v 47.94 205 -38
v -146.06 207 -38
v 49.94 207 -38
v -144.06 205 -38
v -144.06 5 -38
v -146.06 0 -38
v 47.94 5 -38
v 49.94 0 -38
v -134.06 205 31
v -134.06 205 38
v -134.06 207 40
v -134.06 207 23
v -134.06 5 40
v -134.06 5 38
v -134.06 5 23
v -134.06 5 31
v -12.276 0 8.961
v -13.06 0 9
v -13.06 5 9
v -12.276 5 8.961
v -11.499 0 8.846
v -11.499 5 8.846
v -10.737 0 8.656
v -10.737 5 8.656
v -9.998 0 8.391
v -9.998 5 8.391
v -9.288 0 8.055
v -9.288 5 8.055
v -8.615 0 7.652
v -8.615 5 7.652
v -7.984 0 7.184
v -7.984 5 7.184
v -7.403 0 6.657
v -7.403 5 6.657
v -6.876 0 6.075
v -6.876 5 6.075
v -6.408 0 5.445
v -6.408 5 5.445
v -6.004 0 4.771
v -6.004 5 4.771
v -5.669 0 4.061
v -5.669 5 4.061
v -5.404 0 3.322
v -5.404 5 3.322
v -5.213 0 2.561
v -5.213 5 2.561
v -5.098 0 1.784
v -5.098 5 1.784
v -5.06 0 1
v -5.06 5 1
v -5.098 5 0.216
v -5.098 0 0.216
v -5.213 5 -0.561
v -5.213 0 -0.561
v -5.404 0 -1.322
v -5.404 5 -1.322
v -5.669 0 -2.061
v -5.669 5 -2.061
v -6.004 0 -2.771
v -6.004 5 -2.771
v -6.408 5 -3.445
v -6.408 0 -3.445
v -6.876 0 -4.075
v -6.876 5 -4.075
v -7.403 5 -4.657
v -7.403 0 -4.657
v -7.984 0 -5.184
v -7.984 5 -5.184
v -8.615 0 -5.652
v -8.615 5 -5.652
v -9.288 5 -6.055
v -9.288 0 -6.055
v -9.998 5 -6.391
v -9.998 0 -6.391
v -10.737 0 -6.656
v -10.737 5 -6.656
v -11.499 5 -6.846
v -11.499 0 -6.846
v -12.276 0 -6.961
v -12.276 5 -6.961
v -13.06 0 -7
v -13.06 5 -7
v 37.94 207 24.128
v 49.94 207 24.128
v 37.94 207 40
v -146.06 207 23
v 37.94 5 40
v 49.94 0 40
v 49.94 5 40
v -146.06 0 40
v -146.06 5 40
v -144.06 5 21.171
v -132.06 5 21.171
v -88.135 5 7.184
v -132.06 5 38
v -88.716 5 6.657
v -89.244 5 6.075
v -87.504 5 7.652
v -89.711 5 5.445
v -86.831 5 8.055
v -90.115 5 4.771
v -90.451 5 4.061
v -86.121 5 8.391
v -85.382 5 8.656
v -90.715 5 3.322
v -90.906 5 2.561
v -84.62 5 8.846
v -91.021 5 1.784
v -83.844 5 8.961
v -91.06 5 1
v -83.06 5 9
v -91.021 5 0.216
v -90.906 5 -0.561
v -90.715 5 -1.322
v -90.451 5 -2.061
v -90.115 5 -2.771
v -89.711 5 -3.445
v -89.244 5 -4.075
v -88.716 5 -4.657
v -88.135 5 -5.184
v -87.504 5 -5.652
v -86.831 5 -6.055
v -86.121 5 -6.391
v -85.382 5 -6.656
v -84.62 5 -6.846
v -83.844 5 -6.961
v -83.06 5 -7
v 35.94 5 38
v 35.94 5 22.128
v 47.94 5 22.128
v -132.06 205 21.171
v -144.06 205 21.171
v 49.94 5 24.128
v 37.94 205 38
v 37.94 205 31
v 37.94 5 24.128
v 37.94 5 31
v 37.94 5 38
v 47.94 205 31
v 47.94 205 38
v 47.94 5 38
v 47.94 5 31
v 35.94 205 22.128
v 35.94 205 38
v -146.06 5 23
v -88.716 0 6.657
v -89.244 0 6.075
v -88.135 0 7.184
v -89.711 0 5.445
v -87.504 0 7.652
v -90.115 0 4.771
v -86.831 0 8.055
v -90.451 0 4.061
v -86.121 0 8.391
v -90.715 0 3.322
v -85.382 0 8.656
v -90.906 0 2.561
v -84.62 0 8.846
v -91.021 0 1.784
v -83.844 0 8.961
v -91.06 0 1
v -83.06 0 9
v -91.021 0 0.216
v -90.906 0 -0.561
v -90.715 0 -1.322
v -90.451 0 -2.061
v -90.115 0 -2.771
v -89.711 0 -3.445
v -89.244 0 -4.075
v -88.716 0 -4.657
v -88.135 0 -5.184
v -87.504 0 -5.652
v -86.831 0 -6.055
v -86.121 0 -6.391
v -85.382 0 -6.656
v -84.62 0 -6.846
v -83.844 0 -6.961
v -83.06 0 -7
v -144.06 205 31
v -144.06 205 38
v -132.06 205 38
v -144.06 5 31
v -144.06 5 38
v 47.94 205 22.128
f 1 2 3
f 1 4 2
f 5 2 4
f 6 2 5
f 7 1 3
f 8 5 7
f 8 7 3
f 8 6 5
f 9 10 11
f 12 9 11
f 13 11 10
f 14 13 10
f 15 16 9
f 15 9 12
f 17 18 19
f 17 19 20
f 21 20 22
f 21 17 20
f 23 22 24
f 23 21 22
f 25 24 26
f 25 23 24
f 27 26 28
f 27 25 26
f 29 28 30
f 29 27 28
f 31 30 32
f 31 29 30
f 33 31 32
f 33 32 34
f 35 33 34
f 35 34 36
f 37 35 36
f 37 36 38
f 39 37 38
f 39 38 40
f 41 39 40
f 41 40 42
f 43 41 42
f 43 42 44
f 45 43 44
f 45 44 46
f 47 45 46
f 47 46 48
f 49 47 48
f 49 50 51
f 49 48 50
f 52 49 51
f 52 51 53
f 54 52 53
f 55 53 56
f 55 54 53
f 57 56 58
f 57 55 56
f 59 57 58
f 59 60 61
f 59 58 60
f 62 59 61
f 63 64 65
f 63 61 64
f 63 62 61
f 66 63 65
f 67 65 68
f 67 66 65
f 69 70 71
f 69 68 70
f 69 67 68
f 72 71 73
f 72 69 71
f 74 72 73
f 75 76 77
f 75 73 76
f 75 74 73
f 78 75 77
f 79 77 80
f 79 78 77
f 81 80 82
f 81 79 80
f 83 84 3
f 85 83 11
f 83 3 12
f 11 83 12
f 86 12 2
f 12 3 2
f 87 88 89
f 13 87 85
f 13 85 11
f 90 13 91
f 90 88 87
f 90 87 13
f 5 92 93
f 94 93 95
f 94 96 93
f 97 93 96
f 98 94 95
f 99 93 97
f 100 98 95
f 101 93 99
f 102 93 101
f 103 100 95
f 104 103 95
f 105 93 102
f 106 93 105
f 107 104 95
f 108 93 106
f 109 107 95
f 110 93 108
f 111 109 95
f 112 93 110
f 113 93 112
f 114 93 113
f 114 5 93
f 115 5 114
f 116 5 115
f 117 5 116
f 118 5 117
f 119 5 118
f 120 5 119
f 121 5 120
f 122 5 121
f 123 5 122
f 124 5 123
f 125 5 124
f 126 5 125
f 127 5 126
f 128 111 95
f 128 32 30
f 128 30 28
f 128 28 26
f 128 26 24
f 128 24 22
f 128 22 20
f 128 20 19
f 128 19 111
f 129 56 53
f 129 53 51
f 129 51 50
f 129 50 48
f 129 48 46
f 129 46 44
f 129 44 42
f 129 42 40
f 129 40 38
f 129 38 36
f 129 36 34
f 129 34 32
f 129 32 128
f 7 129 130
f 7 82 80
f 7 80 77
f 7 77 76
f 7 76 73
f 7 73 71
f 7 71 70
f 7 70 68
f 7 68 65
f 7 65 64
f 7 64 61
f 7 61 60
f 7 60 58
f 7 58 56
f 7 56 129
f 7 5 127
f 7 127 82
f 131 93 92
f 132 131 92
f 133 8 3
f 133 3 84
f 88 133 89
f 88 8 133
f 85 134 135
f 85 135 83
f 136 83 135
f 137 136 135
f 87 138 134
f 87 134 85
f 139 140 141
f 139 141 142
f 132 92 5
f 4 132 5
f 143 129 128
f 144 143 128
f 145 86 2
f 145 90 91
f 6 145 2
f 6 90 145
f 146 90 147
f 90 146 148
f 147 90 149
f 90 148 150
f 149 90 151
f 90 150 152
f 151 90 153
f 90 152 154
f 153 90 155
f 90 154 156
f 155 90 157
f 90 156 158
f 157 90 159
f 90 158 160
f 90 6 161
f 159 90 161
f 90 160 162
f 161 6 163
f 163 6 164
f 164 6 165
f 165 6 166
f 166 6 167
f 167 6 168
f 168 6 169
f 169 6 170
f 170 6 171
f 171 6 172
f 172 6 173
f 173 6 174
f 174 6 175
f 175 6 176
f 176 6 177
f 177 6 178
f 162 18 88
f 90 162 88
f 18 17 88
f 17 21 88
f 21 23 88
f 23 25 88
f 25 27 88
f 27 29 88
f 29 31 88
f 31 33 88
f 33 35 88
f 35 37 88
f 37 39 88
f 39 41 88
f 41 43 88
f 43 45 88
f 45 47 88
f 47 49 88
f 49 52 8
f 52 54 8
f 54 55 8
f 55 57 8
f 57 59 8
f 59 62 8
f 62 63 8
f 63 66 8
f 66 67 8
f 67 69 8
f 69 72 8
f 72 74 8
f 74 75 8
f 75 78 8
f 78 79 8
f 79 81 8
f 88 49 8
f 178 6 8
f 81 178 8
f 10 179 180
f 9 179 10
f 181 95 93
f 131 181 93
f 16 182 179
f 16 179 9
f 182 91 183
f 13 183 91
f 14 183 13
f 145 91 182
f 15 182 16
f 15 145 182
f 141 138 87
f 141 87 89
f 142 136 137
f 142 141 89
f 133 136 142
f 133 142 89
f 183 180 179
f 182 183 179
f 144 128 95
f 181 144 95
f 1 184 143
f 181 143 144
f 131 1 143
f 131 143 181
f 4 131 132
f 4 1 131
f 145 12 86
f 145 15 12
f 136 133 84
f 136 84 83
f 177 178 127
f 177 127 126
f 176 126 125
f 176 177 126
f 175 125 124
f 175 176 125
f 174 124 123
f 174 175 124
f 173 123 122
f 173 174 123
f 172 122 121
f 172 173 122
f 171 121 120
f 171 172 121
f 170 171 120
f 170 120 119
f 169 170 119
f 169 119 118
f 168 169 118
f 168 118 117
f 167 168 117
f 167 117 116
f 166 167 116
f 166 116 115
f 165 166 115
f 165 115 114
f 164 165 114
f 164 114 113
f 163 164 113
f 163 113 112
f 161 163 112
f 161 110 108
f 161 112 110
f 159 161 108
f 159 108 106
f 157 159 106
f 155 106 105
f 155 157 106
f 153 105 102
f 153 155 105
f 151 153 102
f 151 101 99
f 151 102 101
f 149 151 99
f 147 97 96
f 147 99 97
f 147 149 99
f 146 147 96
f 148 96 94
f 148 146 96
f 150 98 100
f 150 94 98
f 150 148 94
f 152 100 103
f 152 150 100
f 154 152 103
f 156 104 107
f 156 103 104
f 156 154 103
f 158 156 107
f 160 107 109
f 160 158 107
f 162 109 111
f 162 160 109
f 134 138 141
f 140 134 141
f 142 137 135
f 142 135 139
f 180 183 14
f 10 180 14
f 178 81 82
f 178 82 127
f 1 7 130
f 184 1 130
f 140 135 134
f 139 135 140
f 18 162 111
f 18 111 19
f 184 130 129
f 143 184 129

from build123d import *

# Parameters (mm, degrees)
CROQUIS1_W              = 196
CROQUIS1_H              = 78
SALIENTE_EXTRUIR1_DEPTH = 5
CROQUIS2_W              = 10
CROQUIS2_H              = 7
SALIENTE_EXTRUIR2_DEPTH = 200
SALIENTE_EXTRUIR3_DEPTH = 200
SALIENTE_EXTRUIR4_DEPTH = 2
CORTAR_EXTRUIR2_DEPTH   = 10


with BuildPart() as part:
    # Croquis1 → Saliente-Extruir1 (new body)
    with BuildSketch(Plane(origin=(0, 0, 0), x_dir=(1, 0, 0), z_dir=(0, 1, 0))):
        with Locations((-48.059642147, -1)):
            Rectangle(CROQUIS1_W, CROQUIS1_H)
    extrude(amount=SALIENTE_EXTRUIR1_DEPTH)

    # Croquis2 → Saliente-Extruir2 (add)
    with BuildSketch(Plane(origin=(0, 5, 0), x_dir=(1, 0, 0), z_dir=(0, 1, 0))):
        with Locations((-139.059642147, -34.5)):
            Rectangle(CROQUIS2_W, CROQUIS2_H)
        with Locations((42.940357853, -34.5)):
            Rectangle(CROQUIS2_W, CROQUIS2_H)
    extrude(amount=SALIENTE_EXTRUIR2_DEPTH)

    # Croquis4 → Saliente-Extruir3 (add)
    with BuildSketch(Plane(origin=(0, 5, 0), x_dir=(1, 0, 0), z_dir=(0, 1, 0))):
        Polygon((-146.059642147, -23), (-134.059642147, -23), (-134.059642147, -40), (37.940357853, -40), (37.940357853, -24.127895053), (49.940357853, -24.127895053), (49.940357853, 38), (47.940357853, 38), (47.940357853, -22.127895053), (35.940357853, -22.127895053), (35.940357853, -38), (-132.059642147, -38), (-132.059642147, -21.170903905), (-144.059642147, -21.170903905), (-144.059642147, 38), (-146.059642147, 38), align=None)
    extrude(amount=SALIENTE_EXTRUIR3_DEPTH)

    # Croquis5 → Saliente-Extruir4 (add)
    with BuildSketch(Plane(origin=(0, 205, 0), x_dir=(1, 0, 0), z_dir=(0, 1, 0))):
        Polygon((-146.059642147, 38), (49.940357853, 38), (49.940357853, -24.127895053), (37.940357853, -24.127895053), (37.940357853, -40), (-134.059642147, -40), (-134.059642147, -23), (-146.059642147, -23), align=None)
    extrude(amount=SALIENTE_EXTRUIR4_DEPTH)

    # Croquis6 → Cortar-Extruir2 (cut)
    with BuildSketch(Plane.XZ):
        with BuildLine():
            Line((-83.059642147, 9), (-13.059642147, 9))
            ThreePointArc((-13.059642147, 9), (-5.059642147, 1), (-13.059642147, -7))
            Line((-13.059642147, -7), (-83.059642147, -7))
            ThreePointArc((-83.059642147, -7), (-91.059642147, 1), (-83.059642147, 9))
        make_face()
    extrude(amount=-CORTAR_EXTRUIR2_DEPTH, mode=Mode.SUBTRACT)


solid = part.part
